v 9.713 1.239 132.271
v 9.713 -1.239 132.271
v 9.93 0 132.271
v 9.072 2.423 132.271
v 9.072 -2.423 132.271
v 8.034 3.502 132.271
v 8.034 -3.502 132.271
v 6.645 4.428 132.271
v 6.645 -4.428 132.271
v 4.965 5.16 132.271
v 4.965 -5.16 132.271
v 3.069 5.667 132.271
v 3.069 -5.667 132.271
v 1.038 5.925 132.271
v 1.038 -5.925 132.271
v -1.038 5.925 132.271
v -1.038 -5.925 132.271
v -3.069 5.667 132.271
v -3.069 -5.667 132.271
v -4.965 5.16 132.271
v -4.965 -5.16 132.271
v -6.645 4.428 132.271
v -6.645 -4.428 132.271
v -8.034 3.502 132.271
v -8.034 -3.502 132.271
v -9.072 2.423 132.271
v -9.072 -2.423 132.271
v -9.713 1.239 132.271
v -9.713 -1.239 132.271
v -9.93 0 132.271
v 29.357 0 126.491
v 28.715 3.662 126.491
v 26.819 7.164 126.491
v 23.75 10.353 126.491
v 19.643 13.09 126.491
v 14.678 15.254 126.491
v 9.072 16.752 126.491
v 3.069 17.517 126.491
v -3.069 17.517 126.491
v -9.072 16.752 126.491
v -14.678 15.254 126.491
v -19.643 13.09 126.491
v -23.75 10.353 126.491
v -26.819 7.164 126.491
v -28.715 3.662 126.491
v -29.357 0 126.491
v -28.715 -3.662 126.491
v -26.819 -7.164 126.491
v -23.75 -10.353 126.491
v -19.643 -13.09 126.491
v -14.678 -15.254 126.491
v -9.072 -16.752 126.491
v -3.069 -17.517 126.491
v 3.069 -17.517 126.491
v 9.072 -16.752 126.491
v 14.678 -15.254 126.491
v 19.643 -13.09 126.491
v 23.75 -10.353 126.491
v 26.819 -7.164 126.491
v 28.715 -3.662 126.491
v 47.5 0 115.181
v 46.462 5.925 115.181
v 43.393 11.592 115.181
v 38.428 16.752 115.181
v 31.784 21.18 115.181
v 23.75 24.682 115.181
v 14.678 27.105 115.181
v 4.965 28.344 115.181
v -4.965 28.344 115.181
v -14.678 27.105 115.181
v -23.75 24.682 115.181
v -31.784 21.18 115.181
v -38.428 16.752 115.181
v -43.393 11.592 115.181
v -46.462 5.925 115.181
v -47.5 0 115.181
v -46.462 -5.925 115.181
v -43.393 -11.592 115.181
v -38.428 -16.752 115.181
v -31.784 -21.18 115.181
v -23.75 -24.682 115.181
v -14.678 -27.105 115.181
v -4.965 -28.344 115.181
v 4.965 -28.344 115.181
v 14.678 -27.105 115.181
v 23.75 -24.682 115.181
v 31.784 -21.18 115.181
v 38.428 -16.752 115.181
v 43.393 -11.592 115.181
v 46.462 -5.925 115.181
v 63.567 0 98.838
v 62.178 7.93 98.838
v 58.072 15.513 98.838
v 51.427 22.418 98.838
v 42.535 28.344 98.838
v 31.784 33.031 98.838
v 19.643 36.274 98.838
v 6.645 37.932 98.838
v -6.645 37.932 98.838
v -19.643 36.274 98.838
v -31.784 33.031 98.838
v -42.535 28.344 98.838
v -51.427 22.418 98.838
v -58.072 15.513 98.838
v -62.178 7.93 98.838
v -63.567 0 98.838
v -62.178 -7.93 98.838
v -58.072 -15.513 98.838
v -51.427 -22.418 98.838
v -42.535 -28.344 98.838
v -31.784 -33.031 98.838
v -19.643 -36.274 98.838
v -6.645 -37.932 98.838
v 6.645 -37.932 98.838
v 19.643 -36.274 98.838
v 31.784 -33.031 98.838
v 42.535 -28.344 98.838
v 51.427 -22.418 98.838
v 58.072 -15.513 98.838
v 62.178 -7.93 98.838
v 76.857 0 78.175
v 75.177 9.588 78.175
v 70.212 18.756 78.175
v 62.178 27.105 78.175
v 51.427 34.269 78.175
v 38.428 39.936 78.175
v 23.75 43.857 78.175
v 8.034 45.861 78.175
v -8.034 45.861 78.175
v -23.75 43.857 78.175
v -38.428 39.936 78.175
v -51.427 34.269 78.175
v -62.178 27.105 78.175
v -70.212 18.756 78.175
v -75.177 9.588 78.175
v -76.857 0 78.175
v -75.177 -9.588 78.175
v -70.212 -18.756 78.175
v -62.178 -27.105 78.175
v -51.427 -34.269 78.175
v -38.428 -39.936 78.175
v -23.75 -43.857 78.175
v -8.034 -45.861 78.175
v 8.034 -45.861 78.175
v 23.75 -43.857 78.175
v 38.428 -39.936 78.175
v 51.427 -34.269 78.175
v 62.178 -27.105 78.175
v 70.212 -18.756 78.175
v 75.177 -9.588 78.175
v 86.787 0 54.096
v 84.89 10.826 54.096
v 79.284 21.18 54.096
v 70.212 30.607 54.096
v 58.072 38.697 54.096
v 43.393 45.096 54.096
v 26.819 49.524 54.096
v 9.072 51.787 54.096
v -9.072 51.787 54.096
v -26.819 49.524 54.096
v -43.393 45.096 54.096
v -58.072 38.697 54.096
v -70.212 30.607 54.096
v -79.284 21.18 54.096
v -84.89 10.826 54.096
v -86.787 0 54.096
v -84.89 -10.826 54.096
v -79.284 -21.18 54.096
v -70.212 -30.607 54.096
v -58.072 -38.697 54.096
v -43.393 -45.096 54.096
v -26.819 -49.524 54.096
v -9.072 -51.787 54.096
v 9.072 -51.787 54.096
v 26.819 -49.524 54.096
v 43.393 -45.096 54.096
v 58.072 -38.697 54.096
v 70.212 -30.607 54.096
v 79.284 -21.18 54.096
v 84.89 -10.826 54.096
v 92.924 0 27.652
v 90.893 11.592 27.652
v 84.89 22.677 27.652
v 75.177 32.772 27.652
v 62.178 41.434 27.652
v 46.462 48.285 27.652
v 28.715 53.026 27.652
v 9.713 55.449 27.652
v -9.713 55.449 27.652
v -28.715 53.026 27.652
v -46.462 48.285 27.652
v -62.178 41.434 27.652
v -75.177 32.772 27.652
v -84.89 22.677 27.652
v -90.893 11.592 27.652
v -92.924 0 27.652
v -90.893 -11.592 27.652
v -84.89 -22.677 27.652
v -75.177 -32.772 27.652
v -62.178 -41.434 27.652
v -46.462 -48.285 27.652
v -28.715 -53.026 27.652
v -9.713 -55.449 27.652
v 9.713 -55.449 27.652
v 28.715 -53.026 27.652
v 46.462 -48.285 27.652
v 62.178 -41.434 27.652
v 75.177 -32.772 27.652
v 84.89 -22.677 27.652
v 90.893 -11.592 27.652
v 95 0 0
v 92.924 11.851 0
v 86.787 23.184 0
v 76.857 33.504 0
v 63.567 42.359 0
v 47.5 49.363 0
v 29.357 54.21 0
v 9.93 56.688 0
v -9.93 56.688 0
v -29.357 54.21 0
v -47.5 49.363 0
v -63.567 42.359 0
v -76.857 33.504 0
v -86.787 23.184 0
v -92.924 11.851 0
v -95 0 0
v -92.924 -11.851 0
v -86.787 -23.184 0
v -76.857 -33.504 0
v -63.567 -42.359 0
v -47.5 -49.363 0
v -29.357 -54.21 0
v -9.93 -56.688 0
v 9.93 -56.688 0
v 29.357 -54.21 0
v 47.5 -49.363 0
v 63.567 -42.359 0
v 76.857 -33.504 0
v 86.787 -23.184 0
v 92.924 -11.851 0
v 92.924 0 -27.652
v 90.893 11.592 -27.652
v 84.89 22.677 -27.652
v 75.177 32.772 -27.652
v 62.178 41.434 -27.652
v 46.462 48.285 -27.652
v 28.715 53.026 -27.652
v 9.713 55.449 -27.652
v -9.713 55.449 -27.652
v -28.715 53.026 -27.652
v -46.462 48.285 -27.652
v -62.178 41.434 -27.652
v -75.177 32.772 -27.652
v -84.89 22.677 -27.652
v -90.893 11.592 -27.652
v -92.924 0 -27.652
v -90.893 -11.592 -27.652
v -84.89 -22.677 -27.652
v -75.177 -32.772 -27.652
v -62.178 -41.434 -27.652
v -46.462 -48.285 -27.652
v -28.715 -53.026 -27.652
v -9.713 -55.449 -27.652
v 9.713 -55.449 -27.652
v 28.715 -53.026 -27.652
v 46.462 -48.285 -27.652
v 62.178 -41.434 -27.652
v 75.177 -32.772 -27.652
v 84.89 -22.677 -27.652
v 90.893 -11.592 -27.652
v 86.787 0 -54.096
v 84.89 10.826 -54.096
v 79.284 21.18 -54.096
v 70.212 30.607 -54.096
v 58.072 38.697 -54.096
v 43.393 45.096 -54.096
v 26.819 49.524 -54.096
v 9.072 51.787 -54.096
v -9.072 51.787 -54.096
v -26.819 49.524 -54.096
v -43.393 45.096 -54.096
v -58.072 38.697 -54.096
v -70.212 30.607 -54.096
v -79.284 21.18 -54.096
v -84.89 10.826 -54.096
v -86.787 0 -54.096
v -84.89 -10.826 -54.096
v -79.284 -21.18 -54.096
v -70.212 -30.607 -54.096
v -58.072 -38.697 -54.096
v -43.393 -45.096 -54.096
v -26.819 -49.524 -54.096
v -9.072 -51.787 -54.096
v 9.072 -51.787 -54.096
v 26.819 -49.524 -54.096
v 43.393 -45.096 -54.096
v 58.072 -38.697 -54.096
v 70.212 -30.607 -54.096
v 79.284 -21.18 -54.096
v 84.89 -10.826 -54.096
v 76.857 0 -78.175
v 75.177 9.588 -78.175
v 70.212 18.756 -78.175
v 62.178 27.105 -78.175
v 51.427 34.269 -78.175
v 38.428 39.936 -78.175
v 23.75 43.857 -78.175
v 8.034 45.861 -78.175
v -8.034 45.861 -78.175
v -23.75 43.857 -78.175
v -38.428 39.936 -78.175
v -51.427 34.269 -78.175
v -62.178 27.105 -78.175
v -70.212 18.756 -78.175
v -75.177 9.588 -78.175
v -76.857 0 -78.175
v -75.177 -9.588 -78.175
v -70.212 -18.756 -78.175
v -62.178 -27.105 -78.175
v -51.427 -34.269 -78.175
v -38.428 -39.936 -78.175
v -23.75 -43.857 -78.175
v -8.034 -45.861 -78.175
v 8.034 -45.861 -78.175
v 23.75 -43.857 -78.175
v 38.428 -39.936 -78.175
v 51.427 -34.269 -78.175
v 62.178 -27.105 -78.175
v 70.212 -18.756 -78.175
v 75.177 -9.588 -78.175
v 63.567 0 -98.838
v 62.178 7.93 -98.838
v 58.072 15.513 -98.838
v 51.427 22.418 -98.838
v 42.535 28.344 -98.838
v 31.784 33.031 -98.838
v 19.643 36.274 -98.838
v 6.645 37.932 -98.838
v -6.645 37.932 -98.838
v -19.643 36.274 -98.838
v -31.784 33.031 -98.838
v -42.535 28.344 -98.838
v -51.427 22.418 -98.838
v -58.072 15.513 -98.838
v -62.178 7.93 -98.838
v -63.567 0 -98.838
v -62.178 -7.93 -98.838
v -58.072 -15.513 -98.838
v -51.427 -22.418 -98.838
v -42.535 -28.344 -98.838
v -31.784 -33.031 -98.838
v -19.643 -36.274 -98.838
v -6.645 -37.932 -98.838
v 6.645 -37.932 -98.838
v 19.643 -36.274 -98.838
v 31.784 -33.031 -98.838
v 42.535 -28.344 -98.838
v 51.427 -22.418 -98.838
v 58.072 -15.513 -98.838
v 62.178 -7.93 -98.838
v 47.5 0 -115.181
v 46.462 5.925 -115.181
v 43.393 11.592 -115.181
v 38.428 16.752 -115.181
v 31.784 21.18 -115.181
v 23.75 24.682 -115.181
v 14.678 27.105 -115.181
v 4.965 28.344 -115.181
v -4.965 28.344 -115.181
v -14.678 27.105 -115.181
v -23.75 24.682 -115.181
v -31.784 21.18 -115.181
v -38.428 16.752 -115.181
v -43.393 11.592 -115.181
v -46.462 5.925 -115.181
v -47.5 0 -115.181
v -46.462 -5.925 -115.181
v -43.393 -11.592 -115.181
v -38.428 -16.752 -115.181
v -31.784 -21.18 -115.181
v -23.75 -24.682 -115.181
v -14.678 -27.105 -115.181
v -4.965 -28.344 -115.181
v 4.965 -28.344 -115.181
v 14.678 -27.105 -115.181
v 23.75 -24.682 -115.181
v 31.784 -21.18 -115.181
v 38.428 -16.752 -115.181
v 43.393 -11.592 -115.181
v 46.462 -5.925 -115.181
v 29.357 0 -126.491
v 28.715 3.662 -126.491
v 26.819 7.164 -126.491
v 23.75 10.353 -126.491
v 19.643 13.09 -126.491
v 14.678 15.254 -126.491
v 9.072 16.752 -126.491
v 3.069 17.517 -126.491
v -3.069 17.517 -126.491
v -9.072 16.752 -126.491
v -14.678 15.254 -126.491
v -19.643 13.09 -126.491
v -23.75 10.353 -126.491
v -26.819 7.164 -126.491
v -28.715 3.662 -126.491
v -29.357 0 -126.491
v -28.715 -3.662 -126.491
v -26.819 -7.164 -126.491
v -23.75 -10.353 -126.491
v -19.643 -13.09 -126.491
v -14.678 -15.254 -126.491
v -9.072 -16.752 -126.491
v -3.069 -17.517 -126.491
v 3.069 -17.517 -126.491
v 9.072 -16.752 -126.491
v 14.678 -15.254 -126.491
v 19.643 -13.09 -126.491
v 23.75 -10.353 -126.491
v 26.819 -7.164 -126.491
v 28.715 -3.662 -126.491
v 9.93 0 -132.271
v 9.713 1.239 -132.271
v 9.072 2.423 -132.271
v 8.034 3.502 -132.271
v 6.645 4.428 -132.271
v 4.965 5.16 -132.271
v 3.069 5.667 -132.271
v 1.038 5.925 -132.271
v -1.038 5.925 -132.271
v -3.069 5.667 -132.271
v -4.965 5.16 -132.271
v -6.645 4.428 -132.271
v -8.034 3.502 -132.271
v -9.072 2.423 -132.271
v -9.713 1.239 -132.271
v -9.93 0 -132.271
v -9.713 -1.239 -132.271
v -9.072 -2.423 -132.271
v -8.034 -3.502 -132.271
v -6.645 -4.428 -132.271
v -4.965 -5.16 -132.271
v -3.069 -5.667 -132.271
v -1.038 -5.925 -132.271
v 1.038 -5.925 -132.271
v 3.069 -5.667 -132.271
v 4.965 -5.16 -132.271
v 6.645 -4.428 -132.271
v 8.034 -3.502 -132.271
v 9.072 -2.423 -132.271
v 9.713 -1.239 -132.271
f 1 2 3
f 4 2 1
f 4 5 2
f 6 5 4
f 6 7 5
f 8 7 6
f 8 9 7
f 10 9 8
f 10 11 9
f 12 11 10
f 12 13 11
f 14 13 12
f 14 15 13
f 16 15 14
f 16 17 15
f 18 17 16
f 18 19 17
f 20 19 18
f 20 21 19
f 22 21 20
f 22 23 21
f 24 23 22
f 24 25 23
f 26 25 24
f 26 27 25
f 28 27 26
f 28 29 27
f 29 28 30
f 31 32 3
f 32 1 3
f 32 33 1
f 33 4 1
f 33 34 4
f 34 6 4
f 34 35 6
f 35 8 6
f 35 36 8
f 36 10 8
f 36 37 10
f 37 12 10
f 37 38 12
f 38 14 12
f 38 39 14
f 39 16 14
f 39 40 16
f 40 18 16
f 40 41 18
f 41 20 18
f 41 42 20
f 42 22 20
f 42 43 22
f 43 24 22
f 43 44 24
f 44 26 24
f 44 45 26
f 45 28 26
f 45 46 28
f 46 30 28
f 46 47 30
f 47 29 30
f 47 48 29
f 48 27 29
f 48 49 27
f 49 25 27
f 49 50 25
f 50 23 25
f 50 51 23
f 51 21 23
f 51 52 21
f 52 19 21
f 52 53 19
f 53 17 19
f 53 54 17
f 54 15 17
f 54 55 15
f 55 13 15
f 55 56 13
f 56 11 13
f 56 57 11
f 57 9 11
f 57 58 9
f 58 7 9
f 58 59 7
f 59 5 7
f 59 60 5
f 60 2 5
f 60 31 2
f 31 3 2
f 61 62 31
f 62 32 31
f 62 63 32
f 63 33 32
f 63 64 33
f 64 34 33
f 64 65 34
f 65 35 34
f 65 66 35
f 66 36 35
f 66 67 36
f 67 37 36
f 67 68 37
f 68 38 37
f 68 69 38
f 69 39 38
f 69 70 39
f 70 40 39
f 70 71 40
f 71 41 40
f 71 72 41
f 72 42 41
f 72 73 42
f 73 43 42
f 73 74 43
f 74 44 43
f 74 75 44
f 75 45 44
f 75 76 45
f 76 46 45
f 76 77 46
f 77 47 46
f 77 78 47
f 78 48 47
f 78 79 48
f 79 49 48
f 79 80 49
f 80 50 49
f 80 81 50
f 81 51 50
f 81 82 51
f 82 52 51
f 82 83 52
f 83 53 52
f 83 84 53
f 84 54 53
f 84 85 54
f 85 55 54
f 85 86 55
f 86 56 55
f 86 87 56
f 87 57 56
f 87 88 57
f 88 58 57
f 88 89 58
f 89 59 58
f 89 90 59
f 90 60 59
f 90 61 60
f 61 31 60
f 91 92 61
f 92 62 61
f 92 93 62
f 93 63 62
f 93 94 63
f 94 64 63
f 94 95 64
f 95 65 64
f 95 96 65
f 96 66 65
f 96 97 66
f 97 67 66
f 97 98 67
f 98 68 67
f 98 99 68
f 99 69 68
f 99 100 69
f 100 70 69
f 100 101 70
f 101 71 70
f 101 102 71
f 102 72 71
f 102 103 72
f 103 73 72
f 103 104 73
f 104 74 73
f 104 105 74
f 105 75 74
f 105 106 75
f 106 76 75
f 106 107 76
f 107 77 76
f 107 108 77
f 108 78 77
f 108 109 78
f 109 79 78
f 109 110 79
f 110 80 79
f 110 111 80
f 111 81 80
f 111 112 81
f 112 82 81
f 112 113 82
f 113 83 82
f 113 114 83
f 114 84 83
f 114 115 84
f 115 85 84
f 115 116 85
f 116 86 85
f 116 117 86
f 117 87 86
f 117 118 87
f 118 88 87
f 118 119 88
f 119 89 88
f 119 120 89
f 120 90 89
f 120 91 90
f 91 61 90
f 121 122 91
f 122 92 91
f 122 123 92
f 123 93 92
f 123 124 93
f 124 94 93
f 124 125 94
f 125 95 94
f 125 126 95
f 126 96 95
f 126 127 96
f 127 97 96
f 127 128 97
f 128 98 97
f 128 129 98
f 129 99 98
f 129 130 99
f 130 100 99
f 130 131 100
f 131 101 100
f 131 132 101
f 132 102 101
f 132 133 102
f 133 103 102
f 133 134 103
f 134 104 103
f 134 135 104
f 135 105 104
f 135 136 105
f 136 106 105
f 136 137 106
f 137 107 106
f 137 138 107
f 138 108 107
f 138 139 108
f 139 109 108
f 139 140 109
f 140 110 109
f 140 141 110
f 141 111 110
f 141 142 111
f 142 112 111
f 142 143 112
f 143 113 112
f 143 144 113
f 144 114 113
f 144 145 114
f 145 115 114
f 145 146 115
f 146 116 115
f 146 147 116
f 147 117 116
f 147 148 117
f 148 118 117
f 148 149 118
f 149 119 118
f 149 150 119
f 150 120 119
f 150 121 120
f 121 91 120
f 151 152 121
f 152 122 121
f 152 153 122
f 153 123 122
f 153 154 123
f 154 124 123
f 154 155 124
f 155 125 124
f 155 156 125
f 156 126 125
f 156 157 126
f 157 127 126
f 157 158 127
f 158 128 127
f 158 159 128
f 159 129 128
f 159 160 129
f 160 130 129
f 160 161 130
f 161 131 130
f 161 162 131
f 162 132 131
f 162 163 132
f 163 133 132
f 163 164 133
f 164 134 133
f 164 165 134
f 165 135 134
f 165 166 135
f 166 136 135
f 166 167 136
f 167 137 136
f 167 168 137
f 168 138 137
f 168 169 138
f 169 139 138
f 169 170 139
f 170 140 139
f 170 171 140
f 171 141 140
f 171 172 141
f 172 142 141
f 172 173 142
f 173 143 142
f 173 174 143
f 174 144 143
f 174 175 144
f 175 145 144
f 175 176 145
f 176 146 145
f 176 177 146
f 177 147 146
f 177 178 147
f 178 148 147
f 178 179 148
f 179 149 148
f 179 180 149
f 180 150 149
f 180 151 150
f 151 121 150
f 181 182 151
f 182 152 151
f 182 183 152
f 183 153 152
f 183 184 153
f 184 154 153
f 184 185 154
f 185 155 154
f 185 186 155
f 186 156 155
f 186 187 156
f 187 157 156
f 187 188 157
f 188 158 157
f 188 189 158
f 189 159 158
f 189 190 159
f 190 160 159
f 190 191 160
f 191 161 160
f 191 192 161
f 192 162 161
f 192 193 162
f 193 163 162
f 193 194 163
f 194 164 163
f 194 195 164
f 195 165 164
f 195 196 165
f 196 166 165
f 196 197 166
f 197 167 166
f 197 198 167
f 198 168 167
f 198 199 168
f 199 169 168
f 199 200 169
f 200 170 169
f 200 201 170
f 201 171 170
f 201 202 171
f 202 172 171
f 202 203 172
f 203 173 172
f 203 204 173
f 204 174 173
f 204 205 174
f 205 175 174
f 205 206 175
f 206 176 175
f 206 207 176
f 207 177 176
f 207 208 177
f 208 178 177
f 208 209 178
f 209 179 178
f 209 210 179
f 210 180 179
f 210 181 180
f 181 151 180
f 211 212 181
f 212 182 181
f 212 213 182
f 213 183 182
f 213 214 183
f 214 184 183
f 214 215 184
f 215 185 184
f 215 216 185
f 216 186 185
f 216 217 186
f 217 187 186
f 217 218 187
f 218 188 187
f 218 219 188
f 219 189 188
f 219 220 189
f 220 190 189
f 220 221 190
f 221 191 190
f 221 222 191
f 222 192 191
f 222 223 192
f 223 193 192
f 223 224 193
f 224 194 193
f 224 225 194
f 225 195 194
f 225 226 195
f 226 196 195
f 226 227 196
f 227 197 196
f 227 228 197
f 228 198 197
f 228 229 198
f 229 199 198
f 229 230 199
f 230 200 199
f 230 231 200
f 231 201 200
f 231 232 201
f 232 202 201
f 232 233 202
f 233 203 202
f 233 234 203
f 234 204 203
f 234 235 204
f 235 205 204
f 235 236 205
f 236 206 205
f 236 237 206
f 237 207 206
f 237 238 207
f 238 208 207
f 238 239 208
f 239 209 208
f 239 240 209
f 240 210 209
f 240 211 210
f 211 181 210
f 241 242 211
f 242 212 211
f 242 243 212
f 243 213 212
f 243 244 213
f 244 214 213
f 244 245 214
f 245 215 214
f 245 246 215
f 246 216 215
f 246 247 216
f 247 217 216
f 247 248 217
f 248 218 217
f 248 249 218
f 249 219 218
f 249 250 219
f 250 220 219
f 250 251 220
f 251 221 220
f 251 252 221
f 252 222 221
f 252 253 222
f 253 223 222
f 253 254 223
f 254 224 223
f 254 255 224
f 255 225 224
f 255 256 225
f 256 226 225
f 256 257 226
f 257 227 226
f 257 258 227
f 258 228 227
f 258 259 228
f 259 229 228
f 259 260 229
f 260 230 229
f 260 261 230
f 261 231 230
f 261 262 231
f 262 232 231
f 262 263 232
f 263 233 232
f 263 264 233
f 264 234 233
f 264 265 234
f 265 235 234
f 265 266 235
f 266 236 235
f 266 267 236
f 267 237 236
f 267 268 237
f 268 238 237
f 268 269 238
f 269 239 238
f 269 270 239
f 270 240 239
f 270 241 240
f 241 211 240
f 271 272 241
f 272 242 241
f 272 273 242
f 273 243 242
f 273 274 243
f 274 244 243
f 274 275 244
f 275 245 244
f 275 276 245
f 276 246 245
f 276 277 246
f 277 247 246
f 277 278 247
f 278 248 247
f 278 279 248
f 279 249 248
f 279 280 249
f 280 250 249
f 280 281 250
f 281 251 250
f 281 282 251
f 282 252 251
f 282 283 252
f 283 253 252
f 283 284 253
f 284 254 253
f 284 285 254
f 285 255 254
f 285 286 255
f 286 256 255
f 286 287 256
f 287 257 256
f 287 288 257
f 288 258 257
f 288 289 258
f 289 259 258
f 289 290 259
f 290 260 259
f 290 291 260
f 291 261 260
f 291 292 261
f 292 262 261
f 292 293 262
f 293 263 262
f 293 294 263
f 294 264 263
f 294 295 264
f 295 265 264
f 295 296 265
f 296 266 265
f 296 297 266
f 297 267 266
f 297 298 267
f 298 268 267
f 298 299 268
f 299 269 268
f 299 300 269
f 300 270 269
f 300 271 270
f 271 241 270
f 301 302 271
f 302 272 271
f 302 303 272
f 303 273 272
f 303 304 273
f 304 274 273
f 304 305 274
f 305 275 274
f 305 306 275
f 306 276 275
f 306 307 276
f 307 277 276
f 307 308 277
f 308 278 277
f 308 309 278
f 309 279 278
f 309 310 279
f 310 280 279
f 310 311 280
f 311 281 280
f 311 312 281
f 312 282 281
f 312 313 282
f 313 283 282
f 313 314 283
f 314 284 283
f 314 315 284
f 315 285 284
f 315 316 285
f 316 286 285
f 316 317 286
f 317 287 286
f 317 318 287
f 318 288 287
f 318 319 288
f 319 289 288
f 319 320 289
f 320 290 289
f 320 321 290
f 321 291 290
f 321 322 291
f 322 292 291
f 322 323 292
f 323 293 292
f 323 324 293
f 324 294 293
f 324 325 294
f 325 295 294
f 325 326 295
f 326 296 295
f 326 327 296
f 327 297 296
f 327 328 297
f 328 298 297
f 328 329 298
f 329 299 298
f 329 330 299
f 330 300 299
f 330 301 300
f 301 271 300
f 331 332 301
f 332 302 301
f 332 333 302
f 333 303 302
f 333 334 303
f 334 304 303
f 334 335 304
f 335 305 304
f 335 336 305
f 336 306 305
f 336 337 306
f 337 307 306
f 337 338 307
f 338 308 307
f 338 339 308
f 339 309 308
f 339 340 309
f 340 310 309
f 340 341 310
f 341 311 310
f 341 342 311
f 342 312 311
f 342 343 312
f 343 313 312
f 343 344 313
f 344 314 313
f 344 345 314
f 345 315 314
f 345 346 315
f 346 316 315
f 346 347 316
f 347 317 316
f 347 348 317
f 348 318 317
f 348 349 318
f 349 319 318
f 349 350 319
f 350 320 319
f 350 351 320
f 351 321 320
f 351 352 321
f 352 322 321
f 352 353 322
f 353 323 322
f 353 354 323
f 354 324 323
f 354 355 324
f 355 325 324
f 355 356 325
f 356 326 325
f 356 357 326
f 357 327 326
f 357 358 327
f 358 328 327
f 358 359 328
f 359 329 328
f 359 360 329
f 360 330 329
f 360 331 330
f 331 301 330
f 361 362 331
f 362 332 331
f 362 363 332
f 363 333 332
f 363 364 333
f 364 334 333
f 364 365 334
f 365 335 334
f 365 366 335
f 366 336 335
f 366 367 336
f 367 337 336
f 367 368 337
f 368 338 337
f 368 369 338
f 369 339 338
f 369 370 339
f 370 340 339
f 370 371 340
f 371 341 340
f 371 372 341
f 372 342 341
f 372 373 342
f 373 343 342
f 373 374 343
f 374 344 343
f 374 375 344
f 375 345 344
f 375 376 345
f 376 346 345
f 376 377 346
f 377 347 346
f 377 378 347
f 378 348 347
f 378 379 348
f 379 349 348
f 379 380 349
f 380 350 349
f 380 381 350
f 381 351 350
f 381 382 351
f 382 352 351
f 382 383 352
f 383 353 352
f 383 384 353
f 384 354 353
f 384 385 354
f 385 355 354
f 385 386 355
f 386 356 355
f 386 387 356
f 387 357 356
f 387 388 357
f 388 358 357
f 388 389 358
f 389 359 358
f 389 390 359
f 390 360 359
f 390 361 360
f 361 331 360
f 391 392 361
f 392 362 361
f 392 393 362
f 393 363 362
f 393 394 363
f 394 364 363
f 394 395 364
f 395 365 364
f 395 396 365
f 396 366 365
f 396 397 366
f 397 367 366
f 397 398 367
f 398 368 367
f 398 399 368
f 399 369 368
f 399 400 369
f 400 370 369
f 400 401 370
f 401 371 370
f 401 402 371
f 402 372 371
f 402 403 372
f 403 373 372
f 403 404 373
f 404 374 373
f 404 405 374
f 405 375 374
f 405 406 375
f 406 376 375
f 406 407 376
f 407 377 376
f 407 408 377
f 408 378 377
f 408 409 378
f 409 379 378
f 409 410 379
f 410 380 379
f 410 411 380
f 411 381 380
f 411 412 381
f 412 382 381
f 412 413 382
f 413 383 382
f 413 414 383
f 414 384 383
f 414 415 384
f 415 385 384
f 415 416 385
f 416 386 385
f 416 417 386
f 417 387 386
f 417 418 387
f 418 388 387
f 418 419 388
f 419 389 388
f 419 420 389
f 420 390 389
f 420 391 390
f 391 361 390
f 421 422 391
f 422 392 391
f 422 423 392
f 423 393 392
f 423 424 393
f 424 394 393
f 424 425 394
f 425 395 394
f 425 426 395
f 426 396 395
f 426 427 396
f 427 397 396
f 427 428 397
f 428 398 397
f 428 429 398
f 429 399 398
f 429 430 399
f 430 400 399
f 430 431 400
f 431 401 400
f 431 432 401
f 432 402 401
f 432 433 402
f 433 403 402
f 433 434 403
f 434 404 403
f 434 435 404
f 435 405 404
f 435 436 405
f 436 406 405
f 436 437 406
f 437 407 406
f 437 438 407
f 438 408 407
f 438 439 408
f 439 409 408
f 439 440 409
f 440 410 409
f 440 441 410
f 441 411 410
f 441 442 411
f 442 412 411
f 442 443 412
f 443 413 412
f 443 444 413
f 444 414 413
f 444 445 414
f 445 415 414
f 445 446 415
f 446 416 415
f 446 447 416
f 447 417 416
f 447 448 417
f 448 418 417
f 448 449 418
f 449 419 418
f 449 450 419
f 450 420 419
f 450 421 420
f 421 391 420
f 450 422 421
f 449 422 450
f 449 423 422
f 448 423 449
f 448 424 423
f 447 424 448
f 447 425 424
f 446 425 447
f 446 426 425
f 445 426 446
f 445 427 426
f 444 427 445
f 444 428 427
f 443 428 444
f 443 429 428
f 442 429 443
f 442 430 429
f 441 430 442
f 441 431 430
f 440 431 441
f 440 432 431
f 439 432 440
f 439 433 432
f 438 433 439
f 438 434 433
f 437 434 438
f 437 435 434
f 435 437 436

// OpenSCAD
// Generated by SolidPython 1.0.1 on 2020-07-29 00:46:46


scale(v = [5, 3, 7]) {
	sphere(r = 19);
}
/***********************************************
*********      SolidPython code:      **********
************************************************
 
# import packages: SolidPython
from solid import *
from solid.utils import *
from itertools import chain, combinations, permutations


class Resize:

    def __init__(self, scad_file):
        self.scad_file = scad_file
        #self.scad_file = import_scad(scad_file)
        # cone/cylinder param:
        self.r1 = 0
        self.r2 = 0
        self.h = 0
        # rectangular prism param:
        self.w = 0
        self.l = 0
        # ellipse param:
        self.r = 0

    # import OpenScad code (file name corresponds to shape)


    # classify shape + parameters
    def assign(self, param1, param2, param3):
        if self.scad_file == 'cone.scad':
            self.r1 = param1
            self.r2 = param2
            self.h = param3
        elif self.scad_file == 'cylinder.scad':
            self.r1 = param1
            self.r2 = param2
            self.h = param3
        elif self.scad_file == 'rectangularPrism.scad':
            self.h = param1
            self.l = param2
            self.w = param3
        else:
            self.r = param1
            self.h = param2

    # resize parameters
    def iterate(self):
        x = range(3, 20, 2)
        i = 1
        if self.scad_file == 'cone.scad':
            tempList = list(permutations(x, 2))
            for temp in tempList:
                param1 = temp[0]
                param2 = temp[1]
                filepath = 'produced_scad_files/' + 'cone' + str(param1) + '_' + str(param2) + '_' + '.scad'
                scad_render_to_file(cylinder(h=param1, r1=param2, r2=0), filepath)

        elif self.scad_file == 'cylinder.scad':
            tempList = list(permutations(x, 3))
            for temp in tempList:
                param1 = temp[0]
                param2 = temp[1]
                filepath = 'produced_scad_files/' + 'cylinder' + str(param1) + '_' + str(param2) + '_' + '.scad'
                scad_render_to_file(cylinder(h=param1, r1=param2, r2=param2), filepath)

        elif self.scad_file == 'rectangularPrism.scad':
            tempList = list(permutations(x, 3))
            for temp in tempList:
                param1 = temp[0]
                param2 = temp[1]
                param3 = temp[2]
                filepath = 'produced_scad_files/' + 'rectangularPrism' + str(param1) + '_' + str(param2) + '_' + str(
                    param3) + '.scad'
                scad_render_to_file(cube(size=(param1, param2, param3)), filepath)

        elif self.scad_file == 'ellipse.scad':
            tempList = list(permutations(x, 4))
            for temp in tempList:
                param1 = temp[0]
                param2 = temp[1]
                param3 = temp[2]
                param4 = temp[3]
                filepath = 'produced_scad_files/' + 'ellipse' + str(param1) + '_' + str(param2) + '_' + str(param3) + '_' + str(param4) + '.scad'
                scad_render_to_file(scale([param1, param2, param3])(sphere(r=param4)), filepath)

    def render_to_scadfile(self):
        scad_render_to_file(scad, 'example.scad') 
 
************************************************/
